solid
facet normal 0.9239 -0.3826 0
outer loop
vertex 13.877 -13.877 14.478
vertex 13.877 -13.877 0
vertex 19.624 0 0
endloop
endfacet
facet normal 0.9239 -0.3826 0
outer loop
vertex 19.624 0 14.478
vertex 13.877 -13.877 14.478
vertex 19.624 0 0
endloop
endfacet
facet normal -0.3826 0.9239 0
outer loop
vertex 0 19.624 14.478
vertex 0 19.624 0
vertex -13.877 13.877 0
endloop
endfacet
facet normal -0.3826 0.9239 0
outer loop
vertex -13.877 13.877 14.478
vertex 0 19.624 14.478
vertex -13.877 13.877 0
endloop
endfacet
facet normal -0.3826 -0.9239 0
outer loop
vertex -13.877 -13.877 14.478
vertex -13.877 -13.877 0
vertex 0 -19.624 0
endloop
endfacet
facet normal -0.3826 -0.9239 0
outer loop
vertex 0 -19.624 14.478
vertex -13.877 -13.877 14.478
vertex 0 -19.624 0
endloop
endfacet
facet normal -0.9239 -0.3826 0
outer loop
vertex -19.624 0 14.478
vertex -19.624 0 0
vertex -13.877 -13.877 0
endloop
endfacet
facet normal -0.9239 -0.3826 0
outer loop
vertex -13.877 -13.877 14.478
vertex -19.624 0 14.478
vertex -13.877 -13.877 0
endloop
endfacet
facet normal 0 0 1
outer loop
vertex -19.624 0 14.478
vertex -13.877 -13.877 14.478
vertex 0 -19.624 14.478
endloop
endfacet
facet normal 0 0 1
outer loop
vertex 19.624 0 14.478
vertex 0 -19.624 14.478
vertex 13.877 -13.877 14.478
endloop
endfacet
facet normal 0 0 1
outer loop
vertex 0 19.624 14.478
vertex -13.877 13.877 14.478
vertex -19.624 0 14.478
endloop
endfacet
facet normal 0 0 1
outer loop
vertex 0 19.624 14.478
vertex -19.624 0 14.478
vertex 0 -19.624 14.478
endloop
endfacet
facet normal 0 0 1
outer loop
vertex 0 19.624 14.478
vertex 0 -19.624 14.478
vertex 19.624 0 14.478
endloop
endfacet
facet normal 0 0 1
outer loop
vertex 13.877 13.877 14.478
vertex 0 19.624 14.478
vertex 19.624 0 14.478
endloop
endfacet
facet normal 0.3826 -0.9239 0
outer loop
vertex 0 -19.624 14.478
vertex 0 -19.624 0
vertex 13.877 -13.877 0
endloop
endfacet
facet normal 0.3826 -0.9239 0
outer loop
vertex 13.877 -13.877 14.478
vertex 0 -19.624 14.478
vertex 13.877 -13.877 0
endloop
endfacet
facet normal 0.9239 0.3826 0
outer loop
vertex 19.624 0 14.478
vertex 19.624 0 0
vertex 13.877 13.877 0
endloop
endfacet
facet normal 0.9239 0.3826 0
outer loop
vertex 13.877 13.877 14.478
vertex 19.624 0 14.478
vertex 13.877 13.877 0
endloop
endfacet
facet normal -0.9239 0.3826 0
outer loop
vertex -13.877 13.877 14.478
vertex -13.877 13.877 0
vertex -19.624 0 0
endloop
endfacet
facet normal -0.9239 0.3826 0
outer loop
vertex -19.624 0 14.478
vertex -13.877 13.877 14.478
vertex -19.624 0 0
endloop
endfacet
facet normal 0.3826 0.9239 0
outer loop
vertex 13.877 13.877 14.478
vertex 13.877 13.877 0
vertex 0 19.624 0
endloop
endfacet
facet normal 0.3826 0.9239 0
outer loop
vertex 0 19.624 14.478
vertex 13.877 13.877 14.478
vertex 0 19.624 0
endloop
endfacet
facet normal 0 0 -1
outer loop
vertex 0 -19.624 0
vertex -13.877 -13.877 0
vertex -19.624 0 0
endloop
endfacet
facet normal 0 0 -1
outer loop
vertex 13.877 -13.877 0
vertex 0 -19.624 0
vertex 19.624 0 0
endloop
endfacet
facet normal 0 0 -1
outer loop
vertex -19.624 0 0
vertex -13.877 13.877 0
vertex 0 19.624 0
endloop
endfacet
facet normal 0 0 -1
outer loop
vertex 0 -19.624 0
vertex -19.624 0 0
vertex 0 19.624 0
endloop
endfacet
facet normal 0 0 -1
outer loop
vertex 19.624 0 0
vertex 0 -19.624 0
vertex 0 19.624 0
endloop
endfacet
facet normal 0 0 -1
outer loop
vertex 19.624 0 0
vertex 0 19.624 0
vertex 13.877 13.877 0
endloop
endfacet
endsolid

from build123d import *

# Parameters (mm, degrees)
F0_R     = 11.2476084484
F1_DEPTH = 14.478


# Not quite as in the source:
# - a feature of the source that left no trace in its solid (it failed there, or was rolled back) is left out


with BuildPart() as f1:
    # F0 (on Top) → F1 (new body)
    with BuildSketch(Plane.XY):
        Polygon((13.876531439, -13.876531439), (19.6243789597, 0), (13.876531439, 13.876531439), (0, 19.6243789597), (-13.876531439, 13.876531439), (-19.6243789597, 0), (-13.876531439, -13.876531439), (0, -19.6243789597), align=None)
        Circle(F0_R, mode=Mode.SUBTRACT)
        Circle(F0_R)
    extrude(amount=F1_DEPTH)


solid = f1.part
